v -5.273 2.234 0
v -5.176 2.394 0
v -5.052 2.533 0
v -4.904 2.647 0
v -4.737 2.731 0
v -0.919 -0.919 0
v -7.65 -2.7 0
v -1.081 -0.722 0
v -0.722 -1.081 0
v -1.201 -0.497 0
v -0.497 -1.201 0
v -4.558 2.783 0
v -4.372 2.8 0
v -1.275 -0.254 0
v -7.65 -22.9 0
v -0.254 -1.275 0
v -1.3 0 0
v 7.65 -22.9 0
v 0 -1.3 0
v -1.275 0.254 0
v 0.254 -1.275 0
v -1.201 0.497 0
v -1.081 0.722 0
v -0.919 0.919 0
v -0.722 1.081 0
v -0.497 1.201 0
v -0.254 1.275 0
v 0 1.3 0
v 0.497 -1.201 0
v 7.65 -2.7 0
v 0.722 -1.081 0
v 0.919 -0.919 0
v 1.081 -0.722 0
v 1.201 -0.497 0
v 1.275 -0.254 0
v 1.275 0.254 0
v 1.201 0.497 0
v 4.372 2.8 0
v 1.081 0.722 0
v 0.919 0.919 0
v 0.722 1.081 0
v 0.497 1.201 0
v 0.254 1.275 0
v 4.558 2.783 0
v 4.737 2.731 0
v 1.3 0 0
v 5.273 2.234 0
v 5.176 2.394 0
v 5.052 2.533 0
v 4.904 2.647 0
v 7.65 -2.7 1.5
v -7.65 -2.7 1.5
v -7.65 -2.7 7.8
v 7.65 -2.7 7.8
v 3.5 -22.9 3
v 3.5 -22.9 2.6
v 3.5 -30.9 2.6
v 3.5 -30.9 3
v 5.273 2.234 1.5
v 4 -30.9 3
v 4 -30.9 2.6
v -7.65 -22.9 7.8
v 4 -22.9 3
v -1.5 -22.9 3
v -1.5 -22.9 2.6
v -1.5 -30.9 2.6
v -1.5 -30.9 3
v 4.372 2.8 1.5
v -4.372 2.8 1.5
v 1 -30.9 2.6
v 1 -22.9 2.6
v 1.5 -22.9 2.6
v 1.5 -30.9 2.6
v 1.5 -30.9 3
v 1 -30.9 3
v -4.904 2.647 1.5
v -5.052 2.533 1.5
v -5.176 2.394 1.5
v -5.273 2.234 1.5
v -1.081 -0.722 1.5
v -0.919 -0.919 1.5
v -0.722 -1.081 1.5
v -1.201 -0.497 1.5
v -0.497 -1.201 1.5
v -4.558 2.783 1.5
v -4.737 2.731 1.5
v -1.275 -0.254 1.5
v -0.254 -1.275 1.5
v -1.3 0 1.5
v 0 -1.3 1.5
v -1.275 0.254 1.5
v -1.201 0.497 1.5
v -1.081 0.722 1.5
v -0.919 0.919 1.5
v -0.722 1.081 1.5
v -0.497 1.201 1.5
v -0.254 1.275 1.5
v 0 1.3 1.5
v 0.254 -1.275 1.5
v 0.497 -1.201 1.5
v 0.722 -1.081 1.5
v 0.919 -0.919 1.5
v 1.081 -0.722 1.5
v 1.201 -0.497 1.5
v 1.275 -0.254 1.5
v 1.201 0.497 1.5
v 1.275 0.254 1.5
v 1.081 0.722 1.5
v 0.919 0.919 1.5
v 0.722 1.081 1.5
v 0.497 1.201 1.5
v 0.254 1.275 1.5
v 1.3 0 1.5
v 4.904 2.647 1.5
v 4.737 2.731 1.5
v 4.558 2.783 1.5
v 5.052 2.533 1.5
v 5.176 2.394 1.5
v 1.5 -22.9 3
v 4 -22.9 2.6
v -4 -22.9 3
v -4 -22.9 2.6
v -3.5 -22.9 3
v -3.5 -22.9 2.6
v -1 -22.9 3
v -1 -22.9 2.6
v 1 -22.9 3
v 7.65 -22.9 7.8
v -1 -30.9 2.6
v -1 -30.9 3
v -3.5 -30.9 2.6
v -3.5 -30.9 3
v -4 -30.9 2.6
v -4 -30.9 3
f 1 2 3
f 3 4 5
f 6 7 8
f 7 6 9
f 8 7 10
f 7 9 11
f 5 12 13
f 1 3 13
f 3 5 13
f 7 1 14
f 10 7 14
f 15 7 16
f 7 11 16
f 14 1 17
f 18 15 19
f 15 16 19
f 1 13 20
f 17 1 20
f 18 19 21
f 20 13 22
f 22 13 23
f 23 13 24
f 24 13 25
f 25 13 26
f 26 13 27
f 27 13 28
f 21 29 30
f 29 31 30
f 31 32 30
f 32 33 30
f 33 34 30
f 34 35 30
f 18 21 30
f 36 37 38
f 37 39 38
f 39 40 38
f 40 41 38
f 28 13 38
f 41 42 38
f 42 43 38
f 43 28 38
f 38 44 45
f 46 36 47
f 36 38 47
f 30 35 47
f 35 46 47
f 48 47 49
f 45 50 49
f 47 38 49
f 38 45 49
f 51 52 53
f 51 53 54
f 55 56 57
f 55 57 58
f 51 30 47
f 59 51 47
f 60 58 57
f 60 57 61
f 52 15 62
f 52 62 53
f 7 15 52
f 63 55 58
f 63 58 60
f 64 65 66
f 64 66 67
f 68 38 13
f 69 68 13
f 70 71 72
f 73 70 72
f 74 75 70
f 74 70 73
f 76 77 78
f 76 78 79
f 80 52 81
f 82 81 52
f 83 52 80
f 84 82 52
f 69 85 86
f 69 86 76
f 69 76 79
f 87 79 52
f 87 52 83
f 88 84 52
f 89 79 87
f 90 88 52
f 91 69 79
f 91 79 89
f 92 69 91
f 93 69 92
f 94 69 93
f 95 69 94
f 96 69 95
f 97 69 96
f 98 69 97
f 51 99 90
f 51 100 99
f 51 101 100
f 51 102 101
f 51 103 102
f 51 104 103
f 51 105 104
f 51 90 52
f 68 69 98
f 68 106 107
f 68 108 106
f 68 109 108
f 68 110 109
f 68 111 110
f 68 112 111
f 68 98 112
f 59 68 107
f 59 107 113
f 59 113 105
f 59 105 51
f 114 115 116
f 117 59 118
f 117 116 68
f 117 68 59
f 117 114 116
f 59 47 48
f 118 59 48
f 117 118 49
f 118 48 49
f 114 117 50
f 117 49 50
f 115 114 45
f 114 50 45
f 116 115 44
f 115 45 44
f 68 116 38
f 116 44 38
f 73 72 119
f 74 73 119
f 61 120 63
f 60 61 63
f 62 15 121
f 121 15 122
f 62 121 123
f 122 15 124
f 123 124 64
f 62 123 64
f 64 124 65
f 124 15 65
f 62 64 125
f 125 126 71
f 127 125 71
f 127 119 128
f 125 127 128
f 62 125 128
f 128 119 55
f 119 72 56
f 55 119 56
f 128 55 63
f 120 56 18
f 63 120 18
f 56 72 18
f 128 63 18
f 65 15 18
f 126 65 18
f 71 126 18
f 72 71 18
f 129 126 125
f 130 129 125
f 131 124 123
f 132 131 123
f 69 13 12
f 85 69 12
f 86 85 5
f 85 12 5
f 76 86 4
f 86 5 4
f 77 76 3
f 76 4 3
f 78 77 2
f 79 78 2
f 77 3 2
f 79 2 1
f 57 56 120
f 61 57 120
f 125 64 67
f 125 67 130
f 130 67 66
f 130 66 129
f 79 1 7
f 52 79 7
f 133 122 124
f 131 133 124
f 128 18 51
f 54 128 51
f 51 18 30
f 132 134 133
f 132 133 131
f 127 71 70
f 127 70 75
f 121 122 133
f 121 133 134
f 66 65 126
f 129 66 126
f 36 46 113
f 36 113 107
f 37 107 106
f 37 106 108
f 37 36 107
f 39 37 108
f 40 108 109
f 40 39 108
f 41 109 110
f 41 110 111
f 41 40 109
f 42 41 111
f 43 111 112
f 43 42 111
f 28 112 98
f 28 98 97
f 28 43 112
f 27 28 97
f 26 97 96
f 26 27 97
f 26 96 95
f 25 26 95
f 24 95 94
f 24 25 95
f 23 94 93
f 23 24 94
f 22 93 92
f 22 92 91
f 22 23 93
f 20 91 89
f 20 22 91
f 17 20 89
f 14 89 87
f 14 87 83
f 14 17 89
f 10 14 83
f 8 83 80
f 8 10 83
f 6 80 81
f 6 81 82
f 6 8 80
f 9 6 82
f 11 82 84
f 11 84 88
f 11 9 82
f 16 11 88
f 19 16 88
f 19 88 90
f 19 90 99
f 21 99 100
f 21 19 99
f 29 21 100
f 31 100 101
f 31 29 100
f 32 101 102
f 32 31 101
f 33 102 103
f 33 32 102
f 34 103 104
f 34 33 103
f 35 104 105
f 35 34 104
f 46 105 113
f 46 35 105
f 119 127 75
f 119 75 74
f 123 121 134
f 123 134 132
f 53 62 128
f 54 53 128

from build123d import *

# Parameters (mm, degrees)
F0_R     = 1.3
F1_DEPTH = 1.5
F0_W     = 15.3
F0_H     = 20.2
F2_DEPTH = 7.8
F3_W     = 0.5
F3_H     = 0.4
F4_DEPTH = 8


with BuildPart() as f1:
    # F0 (on Top) → F1 (new body)
    with BuildSketch(Plane.XY):
        with BuildLine():
            Line((-5.272679, 2.234062), (-7.65, -2.7))
            Line((-7.65, -2.7), (7.65, -2.7))
            Line((7.65, -2.7), (5.272679, 2.234062))
            ThreePointArc((5.272679, 2.234062), (4.903745, 2.646777), (4.371796, 2.8))
            Line((4.371796, 2.8), (-4.371796, 2.8))
            ThreePointArc((-4.371796, 2.8), (-4.903745, 2.646777), (-5.272679, 2.234062))
        make_face()
        Circle(F0_R, mode=Mode.SUBTRACT)
    extrude(amount=F1_DEPTH)

    # F0 (on Top) → F2 (join)
    with BuildSketch(Plane.XY):
        with Locations((0, -12.8)):
            Rectangle(F0_W, F0_H)
    extrude(amount=F2_DEPTH)

    # F3 (on face) → F4 (join)
    with BuildSketch(Plane.XZ.offset(22.9)):
        with Locations((-3.75, 2.8)):
            Rectangle(F3_W, F3_H)
        with Locations((-1.25, 2.8)):
            Rectangle(F3_W, F3_H)
        with Locations((1.25, 2.8)):
            Rectangle(F3_W, F3_H)
        with Locations((3.75, 2.8)):
            Rectangle(F3_W, F3_H)
    extrude(amount=F4_DEPTH)


solid = f1.part
